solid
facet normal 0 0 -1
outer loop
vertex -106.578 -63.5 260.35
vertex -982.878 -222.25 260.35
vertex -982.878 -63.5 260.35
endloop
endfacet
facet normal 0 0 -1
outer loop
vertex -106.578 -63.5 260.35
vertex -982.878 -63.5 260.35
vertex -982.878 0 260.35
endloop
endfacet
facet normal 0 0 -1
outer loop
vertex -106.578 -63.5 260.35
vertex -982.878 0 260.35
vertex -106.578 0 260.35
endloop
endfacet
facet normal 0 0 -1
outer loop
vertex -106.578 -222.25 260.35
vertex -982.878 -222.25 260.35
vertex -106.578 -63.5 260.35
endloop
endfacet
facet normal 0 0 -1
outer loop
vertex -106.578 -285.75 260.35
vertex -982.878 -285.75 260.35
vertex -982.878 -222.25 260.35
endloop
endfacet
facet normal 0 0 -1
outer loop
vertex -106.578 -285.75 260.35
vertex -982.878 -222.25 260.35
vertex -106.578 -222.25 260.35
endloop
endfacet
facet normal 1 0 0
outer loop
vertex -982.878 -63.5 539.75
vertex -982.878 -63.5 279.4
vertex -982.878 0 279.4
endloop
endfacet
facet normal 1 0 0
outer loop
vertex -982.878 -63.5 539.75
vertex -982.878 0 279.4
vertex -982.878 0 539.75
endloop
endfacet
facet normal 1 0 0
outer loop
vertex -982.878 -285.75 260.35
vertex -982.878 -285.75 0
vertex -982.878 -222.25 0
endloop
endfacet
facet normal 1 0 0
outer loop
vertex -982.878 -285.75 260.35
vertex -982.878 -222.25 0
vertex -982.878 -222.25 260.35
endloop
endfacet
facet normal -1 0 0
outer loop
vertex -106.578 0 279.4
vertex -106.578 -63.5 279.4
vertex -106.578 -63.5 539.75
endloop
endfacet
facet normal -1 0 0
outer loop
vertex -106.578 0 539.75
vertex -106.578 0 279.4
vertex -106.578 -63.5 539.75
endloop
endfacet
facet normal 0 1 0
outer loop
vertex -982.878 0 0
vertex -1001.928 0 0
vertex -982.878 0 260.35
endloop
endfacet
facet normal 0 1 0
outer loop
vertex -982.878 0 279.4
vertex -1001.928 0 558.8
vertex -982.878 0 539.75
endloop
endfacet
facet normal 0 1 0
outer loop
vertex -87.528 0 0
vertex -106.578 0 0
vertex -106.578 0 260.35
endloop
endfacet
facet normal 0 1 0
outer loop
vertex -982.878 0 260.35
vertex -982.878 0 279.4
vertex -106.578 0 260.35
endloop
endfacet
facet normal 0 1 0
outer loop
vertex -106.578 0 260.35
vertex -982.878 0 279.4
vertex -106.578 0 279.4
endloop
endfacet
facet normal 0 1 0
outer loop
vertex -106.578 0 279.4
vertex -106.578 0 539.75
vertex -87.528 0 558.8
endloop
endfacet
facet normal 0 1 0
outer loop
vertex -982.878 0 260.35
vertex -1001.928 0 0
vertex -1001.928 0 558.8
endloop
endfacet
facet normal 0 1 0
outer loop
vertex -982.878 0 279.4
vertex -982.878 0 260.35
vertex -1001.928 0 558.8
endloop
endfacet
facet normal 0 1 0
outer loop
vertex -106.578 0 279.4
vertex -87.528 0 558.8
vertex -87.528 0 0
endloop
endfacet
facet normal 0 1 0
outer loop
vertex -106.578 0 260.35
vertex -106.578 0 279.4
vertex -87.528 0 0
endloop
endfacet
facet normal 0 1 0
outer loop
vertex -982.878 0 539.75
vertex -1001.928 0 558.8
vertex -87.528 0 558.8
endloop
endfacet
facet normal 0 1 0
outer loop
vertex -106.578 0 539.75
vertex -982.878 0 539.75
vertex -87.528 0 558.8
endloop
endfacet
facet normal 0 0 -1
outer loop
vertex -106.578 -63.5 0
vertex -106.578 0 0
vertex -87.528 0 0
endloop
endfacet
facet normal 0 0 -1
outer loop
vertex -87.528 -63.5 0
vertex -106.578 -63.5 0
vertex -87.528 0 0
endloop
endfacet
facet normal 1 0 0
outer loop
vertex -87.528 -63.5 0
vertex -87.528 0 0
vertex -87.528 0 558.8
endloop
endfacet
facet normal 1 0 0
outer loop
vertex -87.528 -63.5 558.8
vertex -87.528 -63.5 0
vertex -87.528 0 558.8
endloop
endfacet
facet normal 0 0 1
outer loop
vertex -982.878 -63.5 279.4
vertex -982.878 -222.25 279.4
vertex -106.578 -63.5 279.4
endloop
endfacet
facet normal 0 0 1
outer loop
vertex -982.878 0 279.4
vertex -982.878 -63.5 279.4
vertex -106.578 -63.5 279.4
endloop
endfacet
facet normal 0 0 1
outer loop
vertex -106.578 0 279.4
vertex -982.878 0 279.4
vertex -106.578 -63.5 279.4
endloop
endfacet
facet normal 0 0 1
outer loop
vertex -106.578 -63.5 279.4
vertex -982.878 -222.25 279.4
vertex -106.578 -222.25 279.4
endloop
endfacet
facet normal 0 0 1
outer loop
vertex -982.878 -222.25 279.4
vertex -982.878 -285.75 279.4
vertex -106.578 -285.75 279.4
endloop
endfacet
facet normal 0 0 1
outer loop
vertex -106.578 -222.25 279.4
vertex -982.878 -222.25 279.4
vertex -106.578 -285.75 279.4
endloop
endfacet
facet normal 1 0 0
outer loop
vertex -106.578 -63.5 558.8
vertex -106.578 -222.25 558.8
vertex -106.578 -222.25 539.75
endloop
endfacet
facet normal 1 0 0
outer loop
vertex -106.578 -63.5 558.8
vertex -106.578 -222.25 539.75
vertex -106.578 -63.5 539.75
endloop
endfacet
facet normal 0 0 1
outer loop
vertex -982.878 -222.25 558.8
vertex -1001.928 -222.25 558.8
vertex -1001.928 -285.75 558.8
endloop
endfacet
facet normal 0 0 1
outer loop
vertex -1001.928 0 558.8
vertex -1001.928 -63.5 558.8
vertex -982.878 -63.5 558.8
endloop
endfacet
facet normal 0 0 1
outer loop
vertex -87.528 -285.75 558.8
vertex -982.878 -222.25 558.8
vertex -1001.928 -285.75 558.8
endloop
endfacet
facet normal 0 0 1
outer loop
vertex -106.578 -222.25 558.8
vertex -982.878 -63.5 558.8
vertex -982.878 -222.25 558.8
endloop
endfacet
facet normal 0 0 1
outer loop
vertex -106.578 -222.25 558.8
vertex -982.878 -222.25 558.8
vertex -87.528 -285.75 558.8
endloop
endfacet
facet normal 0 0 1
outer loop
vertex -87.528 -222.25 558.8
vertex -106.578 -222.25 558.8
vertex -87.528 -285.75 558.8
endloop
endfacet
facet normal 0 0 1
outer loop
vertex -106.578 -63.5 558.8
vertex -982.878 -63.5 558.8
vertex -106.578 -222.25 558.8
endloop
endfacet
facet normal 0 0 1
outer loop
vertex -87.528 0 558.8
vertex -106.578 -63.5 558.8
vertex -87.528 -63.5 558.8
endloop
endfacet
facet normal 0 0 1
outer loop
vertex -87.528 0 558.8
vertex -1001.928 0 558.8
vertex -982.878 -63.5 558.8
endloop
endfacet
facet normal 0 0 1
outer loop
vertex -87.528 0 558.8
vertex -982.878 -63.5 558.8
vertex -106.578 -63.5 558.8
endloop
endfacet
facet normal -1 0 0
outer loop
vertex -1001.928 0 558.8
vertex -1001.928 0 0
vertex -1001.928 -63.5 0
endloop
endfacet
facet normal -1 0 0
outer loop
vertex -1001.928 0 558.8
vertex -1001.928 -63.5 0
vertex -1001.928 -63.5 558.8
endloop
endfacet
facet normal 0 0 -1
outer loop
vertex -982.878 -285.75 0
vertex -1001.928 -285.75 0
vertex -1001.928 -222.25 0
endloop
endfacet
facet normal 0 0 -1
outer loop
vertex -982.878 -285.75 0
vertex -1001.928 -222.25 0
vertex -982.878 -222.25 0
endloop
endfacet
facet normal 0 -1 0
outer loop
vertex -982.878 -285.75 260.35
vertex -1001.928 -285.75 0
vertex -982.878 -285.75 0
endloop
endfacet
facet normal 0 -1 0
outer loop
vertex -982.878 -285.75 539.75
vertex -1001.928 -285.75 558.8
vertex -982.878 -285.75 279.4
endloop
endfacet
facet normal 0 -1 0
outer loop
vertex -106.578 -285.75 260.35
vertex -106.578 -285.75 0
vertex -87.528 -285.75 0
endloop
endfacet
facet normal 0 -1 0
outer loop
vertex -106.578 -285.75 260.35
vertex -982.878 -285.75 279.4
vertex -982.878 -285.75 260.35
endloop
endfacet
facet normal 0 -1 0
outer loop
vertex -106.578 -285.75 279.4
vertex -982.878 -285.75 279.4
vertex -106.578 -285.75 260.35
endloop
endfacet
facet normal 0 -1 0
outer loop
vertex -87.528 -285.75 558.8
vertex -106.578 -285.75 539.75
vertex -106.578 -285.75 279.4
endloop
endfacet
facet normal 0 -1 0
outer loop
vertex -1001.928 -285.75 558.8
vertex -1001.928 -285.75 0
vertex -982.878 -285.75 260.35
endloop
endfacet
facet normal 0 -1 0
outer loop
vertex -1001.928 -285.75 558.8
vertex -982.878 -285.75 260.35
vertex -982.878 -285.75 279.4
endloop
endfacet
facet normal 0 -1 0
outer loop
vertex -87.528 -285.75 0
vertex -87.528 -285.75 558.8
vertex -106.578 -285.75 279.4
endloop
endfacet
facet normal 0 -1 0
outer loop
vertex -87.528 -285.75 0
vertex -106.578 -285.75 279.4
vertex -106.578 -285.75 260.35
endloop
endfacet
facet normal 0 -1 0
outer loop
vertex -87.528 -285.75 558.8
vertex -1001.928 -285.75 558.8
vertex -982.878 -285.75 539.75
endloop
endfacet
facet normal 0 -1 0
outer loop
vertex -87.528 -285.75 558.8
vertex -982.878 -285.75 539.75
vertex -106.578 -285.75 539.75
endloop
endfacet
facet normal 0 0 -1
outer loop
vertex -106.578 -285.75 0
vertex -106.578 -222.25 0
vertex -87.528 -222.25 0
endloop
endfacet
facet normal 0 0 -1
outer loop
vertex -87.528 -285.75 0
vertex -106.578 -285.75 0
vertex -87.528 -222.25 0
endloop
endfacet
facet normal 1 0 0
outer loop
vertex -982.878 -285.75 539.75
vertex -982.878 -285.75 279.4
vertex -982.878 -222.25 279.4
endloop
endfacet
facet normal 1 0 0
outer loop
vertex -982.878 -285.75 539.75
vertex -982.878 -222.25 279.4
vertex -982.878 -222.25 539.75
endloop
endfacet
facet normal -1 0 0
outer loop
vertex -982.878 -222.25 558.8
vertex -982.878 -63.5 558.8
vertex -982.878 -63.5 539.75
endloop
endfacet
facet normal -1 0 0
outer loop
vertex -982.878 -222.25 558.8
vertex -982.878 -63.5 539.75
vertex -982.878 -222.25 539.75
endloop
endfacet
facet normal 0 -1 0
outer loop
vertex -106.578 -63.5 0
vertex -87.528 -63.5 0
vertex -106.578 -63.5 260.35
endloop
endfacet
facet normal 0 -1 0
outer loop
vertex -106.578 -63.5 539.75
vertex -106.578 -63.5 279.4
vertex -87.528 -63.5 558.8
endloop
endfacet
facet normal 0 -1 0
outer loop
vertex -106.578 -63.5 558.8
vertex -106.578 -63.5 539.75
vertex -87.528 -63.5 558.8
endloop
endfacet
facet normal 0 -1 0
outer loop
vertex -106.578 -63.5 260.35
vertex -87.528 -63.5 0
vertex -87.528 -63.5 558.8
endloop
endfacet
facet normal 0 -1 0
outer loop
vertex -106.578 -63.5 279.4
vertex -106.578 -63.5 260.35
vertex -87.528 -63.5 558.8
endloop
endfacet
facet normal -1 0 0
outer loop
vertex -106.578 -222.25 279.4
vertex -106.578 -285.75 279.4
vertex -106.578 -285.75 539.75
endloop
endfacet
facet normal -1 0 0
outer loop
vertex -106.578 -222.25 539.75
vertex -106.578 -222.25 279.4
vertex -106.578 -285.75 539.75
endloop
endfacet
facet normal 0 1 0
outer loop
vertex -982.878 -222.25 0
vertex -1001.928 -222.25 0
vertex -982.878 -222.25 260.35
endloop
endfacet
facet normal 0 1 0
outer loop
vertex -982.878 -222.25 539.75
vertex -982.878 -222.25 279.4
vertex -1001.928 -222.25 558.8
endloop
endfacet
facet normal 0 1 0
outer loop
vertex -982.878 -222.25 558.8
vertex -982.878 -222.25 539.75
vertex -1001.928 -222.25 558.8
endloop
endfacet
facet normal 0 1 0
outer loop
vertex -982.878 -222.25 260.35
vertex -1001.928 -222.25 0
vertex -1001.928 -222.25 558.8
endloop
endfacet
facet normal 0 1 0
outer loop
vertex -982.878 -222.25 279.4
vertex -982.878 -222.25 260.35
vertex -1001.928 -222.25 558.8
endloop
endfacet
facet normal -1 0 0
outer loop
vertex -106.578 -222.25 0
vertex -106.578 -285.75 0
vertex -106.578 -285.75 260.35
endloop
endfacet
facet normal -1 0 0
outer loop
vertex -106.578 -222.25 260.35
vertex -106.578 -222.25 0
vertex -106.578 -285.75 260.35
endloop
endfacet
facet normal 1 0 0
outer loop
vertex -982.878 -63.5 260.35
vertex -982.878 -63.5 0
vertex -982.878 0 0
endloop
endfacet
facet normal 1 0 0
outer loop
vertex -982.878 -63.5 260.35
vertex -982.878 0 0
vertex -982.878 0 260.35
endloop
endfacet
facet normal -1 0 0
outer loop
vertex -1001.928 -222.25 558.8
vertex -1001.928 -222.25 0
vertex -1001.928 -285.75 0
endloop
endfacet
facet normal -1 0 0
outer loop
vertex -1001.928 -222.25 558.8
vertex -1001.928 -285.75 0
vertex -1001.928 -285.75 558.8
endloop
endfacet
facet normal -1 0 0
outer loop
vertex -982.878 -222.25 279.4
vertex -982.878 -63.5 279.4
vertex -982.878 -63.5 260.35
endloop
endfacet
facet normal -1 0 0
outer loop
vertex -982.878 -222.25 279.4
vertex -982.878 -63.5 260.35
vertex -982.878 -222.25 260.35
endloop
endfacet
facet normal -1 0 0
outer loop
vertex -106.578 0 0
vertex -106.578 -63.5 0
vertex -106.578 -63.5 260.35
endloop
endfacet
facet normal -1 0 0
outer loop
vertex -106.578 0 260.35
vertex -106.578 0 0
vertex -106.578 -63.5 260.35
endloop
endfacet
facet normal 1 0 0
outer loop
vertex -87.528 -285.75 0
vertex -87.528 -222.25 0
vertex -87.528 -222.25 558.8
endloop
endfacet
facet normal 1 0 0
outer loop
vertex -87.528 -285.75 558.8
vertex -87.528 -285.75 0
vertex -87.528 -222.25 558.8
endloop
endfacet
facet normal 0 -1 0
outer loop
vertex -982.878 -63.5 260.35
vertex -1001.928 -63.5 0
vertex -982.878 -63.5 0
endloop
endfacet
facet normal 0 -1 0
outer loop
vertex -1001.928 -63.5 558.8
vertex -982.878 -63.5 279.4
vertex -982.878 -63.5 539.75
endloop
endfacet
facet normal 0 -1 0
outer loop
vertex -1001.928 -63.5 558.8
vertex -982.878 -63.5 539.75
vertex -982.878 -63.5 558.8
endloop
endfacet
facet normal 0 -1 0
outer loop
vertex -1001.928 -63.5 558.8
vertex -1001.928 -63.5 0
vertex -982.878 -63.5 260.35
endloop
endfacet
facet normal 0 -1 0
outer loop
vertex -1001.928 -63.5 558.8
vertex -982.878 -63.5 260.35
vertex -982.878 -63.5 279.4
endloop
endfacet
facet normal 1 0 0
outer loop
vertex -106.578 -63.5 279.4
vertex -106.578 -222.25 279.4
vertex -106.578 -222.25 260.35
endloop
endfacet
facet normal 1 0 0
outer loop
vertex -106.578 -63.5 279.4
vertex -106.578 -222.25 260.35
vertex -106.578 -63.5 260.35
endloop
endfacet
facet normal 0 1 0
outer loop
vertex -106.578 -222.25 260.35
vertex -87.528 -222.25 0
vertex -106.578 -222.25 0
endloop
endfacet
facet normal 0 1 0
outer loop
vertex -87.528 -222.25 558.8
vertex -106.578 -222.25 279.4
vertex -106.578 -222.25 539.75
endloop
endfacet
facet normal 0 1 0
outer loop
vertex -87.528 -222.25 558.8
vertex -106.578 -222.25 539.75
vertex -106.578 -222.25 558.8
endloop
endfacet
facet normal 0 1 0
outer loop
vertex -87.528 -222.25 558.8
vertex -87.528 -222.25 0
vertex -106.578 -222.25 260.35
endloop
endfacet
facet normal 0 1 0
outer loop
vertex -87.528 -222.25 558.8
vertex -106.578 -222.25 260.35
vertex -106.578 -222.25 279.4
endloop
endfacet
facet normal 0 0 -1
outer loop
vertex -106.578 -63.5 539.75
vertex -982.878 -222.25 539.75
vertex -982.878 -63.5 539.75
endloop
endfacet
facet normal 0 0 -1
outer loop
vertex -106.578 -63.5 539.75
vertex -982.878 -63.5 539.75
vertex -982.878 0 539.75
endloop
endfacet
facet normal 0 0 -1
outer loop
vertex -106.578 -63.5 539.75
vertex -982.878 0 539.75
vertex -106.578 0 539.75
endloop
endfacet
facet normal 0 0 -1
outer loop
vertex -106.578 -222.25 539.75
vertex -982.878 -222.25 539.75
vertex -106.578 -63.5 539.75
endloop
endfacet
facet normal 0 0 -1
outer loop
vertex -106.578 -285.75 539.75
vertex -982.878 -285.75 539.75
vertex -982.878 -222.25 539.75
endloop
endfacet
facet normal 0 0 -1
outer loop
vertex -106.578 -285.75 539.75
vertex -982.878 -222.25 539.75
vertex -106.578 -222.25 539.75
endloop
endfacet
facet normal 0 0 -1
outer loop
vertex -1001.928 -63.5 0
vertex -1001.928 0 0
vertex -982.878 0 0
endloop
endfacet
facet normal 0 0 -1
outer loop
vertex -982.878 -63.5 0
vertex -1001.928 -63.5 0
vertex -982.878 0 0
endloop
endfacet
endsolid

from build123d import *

# Parameters (mm, degrees)
F0_W     = 914.4
F0_H     = 558.8
F1_DEPTH = 285.75
F2_W     = 876.3
F2_H     = 260.35
F3_DEPTH = 285.751
F4_W     = 158.75
F4_H     = 558.8
F5_DEPTH = 19.05
F6_W     = 158.75
F6_H     = 558.8
F7_DEPTH = 19.05


with BuildPart() as f1:
    # F0 (on Front) → F1 (new body)
    with BuildSketch(Plane.XZ):
        with Locations((-544.727786, 279.4)):
            Rectangle(F0_W, F0_H)
    extrude(amount=F1_DEPTH)

    # F2 (on face) → F3 (cut, through all)
    with BuildSketch(Plane.XZ.offset(285.75)):
        with Locations((-544.727786, 130.175)):
            Rectangle(F2_W, F2_H)
        with Locations((-544.727786, 409.575)):
            Rectangle(F2_W, F2_H)
    extrude(amount=-F3_DEPTH, mode=Mode.SUBTRACT)

    # F4 (on face) → F5 (cut, through all)
    with BuildSketch(Plane.YZ.offset(-87.527786)):
        with Locations((-142.875, 279.4)):
            Rectangle(F4_W, F4_H)
    extrude(amount=-F5_DEPTH, mode=Mode.SUBTRACT)

    # F6 (on face) → F7 (cut, through all)
    with BuildSketch(Plane(origin=(-1001.927786, 0, 0), x_dir=(0, -1, 0), z_dir=(-1, 0, 0))):
        with Locations((142.875, 279.4)):
            Rectangle(F6_W, F6_H)
    extrude(amount=-F7_DEPTH, mode=Mode.SUBTRACT)


solid = f1.part
